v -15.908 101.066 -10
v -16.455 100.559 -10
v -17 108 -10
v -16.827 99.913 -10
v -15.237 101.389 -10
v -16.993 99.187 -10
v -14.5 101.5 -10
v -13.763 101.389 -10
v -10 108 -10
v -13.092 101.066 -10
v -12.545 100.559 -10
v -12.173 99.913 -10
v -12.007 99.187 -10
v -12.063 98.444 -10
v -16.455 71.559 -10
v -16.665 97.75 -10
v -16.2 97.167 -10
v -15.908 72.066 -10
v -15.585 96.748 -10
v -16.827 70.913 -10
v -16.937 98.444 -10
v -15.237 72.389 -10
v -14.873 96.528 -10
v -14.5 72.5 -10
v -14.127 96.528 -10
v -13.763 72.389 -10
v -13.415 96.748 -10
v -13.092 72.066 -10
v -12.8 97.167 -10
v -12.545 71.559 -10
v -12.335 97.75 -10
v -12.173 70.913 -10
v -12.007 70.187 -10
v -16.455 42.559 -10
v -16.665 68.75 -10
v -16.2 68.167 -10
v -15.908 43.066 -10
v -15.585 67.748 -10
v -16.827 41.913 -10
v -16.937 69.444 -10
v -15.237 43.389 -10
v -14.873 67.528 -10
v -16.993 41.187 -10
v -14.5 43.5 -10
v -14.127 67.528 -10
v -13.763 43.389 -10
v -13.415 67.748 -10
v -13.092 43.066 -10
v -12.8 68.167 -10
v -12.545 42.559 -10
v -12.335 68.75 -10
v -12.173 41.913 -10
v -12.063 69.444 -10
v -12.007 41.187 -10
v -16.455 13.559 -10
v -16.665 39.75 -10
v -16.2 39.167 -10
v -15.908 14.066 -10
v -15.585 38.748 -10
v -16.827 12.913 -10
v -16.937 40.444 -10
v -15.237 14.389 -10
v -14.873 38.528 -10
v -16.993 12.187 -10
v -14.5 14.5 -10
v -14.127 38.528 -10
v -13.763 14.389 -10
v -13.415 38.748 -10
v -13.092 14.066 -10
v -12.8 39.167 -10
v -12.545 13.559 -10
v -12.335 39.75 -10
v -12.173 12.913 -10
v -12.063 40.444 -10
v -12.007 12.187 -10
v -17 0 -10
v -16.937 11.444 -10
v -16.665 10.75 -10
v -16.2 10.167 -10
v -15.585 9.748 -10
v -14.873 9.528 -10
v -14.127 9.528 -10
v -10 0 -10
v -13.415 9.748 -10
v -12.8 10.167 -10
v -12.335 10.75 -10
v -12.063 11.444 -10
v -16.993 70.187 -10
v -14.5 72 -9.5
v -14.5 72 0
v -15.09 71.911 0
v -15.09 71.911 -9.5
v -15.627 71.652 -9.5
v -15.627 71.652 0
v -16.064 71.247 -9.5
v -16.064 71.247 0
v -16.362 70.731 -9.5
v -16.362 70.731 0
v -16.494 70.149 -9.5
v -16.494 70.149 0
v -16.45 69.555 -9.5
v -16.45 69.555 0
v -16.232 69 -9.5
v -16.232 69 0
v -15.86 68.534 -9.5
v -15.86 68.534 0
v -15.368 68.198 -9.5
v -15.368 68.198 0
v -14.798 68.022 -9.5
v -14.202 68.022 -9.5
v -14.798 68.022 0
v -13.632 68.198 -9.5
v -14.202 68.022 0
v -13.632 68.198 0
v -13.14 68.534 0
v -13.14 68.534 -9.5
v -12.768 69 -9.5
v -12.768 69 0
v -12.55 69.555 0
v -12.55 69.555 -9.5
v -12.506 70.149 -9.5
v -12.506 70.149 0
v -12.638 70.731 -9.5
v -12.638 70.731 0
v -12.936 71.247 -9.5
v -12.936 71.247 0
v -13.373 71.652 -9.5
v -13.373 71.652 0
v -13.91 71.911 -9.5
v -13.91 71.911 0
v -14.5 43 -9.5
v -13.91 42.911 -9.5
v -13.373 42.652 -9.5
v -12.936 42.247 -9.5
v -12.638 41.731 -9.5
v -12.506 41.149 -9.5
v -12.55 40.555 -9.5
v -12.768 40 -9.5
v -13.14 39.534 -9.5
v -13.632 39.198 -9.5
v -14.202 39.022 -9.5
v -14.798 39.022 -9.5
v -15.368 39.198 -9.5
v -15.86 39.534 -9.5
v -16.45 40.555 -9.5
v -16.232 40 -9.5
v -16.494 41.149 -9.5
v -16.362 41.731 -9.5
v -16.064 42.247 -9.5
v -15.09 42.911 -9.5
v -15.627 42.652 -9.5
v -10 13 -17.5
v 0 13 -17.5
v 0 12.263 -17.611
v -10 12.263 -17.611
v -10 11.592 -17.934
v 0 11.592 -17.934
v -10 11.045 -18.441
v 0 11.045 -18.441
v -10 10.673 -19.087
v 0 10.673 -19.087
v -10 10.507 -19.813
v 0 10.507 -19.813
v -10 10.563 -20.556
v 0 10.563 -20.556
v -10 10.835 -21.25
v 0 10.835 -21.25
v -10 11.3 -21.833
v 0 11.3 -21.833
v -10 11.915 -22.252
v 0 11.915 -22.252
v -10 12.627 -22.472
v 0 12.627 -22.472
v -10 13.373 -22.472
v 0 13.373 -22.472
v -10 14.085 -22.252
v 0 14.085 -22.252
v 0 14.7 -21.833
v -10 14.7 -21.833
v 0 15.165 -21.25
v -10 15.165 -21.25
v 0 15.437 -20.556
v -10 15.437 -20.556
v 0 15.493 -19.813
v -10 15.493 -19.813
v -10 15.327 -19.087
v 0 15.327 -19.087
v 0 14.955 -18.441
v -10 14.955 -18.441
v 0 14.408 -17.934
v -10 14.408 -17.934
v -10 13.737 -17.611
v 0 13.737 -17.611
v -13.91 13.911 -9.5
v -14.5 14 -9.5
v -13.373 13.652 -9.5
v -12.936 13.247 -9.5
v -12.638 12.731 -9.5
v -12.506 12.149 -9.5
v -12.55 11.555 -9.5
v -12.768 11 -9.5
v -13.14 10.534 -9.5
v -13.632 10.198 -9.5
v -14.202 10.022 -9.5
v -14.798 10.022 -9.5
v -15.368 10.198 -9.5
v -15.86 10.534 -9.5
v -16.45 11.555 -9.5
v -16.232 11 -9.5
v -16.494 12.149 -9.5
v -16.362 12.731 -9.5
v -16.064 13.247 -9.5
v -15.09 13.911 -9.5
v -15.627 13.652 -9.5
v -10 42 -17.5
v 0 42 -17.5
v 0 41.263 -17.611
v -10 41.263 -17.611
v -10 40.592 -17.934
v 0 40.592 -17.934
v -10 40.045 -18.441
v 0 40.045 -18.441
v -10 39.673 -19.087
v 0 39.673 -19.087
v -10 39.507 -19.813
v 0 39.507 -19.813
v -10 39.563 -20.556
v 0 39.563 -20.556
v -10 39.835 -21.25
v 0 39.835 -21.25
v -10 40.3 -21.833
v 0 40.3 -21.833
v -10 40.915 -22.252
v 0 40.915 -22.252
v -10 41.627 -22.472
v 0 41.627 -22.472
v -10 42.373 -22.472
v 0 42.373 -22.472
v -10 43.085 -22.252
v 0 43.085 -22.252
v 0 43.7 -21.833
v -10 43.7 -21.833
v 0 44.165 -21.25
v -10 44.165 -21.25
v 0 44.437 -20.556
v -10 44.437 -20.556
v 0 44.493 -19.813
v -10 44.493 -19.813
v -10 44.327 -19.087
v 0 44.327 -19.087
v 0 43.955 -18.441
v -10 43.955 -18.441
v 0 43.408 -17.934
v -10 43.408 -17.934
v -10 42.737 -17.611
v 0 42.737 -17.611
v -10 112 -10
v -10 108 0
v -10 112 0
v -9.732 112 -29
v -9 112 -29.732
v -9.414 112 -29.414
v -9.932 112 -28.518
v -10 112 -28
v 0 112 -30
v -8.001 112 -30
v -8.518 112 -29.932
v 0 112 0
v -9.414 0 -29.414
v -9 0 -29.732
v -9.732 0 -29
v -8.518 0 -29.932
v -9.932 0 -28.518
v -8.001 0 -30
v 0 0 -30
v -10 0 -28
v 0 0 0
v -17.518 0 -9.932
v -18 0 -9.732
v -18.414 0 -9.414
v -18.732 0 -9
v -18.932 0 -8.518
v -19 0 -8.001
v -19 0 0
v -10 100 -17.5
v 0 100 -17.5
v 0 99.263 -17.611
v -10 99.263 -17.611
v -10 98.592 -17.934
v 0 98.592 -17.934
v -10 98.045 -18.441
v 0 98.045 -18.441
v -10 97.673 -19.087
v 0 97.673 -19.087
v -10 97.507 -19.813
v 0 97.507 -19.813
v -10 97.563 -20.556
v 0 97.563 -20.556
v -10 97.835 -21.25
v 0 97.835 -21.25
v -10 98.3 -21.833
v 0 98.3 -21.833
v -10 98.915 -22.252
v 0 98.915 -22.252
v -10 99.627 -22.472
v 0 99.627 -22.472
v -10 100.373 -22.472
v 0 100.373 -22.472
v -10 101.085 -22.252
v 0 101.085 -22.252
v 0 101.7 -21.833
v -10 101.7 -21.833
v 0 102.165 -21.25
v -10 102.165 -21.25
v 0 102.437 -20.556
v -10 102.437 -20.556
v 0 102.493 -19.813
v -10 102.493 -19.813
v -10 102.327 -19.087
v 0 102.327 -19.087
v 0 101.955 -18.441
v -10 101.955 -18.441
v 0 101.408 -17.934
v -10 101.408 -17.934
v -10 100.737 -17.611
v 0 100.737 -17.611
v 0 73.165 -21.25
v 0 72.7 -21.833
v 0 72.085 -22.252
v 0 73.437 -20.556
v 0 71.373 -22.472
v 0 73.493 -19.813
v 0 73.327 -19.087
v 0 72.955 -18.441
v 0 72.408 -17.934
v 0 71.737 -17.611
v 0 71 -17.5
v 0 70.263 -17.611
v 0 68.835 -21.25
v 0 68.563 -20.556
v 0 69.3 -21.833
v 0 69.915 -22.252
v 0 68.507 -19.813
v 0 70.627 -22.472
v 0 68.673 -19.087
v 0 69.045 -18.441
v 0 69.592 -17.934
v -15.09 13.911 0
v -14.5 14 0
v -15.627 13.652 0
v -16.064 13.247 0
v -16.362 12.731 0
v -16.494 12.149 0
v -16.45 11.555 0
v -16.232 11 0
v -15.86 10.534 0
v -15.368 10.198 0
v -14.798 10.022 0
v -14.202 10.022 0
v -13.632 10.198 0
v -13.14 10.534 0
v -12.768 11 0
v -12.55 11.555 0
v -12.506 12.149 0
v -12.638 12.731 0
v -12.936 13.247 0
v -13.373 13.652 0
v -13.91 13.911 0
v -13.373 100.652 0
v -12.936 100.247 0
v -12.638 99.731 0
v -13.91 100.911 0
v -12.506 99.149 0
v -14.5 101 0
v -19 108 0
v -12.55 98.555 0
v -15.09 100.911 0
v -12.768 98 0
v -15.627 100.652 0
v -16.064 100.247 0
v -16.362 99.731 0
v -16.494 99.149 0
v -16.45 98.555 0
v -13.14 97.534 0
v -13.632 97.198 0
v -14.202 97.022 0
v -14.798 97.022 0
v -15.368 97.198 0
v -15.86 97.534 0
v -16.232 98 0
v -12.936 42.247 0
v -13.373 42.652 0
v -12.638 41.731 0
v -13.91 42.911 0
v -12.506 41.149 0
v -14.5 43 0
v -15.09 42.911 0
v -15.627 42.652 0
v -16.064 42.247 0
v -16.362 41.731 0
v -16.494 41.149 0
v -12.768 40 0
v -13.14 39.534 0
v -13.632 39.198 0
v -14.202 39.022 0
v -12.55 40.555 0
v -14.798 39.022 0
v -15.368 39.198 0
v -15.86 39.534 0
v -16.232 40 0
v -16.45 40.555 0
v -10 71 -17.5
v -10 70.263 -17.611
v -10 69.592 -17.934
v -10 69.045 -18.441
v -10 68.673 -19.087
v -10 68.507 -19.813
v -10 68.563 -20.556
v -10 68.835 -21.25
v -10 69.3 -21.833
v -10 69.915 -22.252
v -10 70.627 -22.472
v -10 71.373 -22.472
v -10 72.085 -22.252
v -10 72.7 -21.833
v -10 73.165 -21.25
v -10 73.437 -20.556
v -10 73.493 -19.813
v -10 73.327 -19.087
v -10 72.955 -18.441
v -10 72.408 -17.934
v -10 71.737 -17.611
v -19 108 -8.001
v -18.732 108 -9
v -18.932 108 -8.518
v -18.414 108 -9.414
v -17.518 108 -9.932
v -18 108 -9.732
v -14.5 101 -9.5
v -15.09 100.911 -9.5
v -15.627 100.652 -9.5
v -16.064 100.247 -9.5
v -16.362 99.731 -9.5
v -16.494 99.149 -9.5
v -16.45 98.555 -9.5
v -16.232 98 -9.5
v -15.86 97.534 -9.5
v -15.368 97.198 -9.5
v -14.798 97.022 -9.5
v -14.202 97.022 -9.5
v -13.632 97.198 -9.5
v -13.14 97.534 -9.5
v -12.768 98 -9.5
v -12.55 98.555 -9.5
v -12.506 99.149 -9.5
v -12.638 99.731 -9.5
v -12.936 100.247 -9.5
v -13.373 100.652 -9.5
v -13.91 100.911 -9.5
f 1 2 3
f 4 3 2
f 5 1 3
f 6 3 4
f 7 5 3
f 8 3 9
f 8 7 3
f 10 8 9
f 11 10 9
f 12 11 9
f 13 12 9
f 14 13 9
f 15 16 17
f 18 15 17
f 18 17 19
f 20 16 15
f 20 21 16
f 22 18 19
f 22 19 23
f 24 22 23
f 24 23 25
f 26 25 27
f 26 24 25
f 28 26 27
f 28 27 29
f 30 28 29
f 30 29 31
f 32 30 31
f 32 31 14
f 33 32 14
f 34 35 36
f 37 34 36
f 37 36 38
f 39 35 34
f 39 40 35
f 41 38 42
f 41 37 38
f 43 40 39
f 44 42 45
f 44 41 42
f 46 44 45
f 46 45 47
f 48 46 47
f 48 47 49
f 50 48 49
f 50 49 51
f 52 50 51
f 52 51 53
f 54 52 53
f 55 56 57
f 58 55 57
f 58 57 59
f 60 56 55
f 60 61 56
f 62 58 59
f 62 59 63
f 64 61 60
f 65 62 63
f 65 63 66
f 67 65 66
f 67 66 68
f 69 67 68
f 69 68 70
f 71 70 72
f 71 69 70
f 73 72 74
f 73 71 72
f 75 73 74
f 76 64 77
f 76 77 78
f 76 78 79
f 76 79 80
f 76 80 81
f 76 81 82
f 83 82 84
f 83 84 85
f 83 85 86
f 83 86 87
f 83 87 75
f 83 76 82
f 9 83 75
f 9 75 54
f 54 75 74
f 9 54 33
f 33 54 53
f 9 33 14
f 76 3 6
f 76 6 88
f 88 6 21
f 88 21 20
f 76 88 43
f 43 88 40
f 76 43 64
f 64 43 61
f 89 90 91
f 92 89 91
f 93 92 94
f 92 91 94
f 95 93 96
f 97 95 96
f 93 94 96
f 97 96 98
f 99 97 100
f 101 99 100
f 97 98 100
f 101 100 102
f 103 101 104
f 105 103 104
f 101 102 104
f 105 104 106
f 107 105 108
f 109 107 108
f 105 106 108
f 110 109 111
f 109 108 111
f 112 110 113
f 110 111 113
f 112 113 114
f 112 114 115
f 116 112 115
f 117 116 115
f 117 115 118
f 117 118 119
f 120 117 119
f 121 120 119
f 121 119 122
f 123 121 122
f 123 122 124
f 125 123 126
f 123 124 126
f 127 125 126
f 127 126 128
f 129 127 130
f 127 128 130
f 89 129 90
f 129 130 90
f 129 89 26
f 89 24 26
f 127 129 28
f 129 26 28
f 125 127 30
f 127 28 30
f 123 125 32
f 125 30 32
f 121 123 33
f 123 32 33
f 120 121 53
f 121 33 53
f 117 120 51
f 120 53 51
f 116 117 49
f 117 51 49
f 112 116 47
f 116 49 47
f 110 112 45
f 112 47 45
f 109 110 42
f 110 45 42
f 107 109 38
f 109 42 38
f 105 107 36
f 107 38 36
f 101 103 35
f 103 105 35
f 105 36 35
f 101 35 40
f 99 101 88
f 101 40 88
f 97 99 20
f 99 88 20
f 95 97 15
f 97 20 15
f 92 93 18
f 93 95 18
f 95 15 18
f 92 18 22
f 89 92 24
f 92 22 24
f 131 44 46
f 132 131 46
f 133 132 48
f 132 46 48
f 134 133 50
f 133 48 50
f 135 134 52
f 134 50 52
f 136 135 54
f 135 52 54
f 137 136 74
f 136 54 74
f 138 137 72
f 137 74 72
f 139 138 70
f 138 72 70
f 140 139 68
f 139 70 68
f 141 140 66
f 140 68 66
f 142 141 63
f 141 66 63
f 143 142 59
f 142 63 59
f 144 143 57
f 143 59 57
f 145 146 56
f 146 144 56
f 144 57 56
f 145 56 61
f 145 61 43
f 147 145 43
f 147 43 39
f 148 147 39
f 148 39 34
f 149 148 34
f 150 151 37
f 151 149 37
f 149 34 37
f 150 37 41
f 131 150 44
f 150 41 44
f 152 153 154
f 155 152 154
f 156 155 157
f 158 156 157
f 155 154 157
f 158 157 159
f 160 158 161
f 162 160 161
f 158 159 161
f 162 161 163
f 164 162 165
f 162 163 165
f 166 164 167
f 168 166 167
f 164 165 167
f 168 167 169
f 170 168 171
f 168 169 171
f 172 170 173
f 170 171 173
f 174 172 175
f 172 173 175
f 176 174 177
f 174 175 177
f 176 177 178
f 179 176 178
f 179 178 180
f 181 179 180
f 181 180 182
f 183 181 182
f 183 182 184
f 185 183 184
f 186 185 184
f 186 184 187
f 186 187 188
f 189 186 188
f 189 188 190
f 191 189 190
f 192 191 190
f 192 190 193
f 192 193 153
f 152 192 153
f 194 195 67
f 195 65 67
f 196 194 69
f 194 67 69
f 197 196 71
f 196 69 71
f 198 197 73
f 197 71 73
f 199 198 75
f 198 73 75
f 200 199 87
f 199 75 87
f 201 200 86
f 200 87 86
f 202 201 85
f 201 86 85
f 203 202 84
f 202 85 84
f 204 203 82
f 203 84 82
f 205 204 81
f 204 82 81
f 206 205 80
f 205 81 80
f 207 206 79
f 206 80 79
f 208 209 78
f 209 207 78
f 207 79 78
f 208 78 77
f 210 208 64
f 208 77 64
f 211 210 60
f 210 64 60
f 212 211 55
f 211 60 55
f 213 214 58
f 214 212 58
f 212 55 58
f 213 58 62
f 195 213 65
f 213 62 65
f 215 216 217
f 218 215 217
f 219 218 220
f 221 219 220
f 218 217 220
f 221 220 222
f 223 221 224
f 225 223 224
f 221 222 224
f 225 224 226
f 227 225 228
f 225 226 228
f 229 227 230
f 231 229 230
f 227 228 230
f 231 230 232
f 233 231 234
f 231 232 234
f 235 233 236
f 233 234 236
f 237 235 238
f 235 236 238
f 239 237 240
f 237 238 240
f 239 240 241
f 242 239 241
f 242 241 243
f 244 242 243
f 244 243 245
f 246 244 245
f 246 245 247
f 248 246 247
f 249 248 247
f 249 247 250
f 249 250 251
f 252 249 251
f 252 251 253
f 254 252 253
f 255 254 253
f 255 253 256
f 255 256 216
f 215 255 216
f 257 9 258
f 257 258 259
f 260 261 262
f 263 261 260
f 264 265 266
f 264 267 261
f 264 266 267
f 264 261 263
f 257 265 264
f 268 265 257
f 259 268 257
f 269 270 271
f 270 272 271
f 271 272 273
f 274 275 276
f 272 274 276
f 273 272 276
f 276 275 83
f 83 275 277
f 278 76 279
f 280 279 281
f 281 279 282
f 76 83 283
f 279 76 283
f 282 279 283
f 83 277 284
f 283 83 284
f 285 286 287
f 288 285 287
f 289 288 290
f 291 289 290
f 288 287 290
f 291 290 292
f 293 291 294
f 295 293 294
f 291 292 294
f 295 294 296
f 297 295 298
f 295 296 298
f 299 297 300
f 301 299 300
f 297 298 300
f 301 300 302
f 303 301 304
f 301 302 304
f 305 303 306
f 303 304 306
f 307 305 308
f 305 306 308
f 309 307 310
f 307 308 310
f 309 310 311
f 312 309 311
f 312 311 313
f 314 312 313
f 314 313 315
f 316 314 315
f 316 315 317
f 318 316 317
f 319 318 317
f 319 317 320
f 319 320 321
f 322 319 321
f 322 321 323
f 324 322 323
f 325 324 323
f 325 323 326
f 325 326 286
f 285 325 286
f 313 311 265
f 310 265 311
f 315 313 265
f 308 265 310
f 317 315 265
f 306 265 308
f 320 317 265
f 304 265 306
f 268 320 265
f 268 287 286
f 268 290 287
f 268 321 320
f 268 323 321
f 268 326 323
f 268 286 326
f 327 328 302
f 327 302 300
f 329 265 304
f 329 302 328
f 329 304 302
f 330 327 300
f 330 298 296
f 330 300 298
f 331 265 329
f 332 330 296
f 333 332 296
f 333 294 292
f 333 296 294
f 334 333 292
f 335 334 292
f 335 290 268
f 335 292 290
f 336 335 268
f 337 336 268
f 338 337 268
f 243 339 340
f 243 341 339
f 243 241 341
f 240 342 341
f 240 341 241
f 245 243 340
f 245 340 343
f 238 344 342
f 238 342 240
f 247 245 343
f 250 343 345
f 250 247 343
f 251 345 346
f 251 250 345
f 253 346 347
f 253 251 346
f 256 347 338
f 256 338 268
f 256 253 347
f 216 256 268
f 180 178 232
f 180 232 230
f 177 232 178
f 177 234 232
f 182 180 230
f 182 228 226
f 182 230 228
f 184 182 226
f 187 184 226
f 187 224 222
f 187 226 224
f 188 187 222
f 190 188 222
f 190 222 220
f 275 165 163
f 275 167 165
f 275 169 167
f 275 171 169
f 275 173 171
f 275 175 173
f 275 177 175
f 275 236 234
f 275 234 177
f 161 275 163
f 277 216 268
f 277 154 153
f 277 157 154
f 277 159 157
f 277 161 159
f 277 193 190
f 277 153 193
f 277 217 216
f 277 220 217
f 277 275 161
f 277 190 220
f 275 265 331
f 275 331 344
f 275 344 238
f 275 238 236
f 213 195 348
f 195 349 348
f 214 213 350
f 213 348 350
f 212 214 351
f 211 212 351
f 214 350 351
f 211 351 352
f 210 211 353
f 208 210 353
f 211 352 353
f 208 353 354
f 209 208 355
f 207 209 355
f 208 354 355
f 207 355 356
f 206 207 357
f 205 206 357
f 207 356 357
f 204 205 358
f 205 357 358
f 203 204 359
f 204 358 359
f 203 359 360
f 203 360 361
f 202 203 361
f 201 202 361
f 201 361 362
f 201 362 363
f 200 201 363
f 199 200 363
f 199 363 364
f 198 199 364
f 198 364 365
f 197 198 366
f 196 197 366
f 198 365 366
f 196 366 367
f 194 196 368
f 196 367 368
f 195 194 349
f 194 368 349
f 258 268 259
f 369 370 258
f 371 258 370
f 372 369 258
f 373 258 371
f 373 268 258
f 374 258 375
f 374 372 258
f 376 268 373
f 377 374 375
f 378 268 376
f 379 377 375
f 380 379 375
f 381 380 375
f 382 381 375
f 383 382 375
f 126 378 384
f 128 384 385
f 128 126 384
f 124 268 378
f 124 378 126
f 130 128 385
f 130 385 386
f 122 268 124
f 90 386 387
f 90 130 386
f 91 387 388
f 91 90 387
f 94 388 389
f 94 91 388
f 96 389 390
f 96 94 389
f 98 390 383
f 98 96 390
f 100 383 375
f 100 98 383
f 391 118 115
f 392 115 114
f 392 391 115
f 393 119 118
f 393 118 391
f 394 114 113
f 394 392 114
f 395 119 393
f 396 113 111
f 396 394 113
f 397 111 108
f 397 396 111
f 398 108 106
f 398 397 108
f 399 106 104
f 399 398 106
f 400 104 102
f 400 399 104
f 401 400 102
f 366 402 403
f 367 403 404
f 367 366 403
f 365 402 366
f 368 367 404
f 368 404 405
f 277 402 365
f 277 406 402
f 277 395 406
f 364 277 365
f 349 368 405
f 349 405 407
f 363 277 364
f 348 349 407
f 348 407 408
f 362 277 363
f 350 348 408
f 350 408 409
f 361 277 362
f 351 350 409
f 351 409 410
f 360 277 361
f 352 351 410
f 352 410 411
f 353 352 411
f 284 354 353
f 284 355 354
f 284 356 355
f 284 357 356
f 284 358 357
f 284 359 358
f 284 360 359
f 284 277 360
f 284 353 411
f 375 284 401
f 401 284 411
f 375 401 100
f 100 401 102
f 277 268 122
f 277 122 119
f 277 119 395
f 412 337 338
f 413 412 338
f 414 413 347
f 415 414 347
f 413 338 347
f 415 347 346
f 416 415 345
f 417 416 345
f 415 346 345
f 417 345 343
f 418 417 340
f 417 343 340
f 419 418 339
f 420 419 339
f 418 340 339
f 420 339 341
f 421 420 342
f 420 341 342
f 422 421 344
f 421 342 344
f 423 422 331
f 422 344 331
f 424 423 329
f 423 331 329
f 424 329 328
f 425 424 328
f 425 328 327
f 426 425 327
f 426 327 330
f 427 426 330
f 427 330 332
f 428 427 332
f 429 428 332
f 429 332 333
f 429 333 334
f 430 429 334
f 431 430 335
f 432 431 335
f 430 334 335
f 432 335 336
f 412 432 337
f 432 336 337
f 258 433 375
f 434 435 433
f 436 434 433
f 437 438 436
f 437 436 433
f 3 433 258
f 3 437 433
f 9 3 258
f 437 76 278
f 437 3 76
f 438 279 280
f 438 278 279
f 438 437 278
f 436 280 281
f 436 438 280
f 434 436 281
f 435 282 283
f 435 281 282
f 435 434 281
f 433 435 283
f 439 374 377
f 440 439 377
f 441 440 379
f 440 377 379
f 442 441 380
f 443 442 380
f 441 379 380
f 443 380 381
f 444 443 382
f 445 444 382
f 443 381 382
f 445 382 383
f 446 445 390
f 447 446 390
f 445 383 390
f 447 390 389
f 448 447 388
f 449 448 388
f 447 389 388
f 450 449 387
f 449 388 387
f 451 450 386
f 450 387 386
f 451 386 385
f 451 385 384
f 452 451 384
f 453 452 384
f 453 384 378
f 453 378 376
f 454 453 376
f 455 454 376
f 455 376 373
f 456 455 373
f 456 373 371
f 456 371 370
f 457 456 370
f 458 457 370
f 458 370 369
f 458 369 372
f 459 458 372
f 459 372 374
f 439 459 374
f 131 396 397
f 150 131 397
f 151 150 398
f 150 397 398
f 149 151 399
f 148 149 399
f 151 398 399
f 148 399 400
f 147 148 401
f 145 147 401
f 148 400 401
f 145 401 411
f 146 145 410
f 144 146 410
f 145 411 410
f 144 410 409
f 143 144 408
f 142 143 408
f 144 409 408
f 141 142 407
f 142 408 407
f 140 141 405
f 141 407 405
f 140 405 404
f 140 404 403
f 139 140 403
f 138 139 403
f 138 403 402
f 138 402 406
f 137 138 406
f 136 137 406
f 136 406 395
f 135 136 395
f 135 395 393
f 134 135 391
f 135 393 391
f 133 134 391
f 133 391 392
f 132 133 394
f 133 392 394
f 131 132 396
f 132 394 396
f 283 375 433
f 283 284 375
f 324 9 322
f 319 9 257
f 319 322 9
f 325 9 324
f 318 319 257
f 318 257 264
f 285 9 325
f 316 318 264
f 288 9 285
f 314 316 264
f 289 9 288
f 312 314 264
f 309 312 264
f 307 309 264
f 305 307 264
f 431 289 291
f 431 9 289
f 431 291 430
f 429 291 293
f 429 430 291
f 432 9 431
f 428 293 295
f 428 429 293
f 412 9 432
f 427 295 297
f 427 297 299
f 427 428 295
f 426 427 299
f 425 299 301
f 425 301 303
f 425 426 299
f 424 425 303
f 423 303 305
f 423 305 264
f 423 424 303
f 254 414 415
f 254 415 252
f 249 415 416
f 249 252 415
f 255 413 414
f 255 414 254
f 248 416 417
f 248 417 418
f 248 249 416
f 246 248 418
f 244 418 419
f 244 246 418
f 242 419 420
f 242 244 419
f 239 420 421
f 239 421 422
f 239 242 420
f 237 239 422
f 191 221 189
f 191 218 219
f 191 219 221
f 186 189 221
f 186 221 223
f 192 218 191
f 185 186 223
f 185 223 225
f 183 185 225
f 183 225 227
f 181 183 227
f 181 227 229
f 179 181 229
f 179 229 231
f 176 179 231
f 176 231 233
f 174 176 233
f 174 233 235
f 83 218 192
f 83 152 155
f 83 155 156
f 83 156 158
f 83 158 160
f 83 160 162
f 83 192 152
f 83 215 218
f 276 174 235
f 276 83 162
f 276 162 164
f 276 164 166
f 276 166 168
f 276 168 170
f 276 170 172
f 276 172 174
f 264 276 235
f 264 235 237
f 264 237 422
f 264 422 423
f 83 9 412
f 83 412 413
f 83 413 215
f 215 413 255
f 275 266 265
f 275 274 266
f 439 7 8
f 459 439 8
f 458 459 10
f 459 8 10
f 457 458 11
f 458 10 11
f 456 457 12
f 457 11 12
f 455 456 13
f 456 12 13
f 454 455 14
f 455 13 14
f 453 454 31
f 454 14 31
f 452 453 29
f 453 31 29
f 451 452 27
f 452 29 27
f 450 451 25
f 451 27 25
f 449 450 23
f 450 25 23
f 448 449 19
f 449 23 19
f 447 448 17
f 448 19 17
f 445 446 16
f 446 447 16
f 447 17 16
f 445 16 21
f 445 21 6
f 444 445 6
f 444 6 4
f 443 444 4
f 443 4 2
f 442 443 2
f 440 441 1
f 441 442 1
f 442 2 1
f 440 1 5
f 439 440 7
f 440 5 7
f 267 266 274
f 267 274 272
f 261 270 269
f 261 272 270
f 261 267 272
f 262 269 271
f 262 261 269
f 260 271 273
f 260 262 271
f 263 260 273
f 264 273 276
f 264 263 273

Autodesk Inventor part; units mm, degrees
ref_plane "YZ Plane" through (0, 0, 0) normal (1, 0, 0) x (0, 1, 0)
ref_plane "XZ Plane" through (0, 0, 0) normal (0, 1, 0) x (-1, 0, 0)
ref_plane "XY Plane" through (0, 0, 0) normal (0, 0, 1) x (1, 0, 0)
sketch "Skizze2" plane through (0, 0, 0) normal (0, 1, 0) x (-1, 0, 0)
  line L0 (0, 0) -> (19, 0)
  line L1 (19, 0) -> (19, -10)
  line L2 (19, -10) -> (10, -10)
  line L3 (10, -10) -> (10, -30)
  line L4 (10, -30) -> (0, -30)
  line L5 (0, -30) -> (0, 0)
  dimension "d6" = 10
  dimension "d7" = 20
  dimension "d8" = 10
  dimension "d9" = 9
extrude "Extrusion1" add sketch "Skizze2" along normal blind 112
sketch "Skizze3" plane through (-10, 0, -10) normal (0, 0, -1) x (-1, 0, 0)
  line L0 (0, 112) -> (9, 112) projected
  point P0 (-10, 0)
  point P1 (4.5, 99)
  point P2 (4.5, 70)
  point P3 (4.5, 41)
  point P4 (4.5, 12)
  point P5 (4.5, 112)
  point P6 (4.5, 112)
  dimension "d12" = 13
  dimension "d13" = 29
  dimension "d14" = 29
  dimension "d15" = 29
hole "Bohrung1" at (-14.5, 99, -10) at (-14.5, 70, -10) at (-14.5, 41, -10) at (-14.5, 12, -10) direction (0, 0, 1) diameter 4 depth 10 countersink diameter 5 countersink angle 90
sketch "Skizze4" plane through (-10, 0, -30) normal (-1, 0, 0) x (0, 0, 1)
  line L0 (0, 112) -> (20, 112) projected
  line L1 (0, 0) -> (20, 0) projected
  point P0 (30, 0)
  point P1 (10, 100)
  point P2 (10, 71)
  point P3 (10, 42)
  point P4 (10, 13)
  point P5 (10, 0)
  dimension "d30" = 12
  dimension "d31" = 29
  dimension "d32" = 29
  dimension "d33" = 29
hole "Bohrung2" at (-10, 100, -20) at (-10, 71, -20) at (-10, 42, -20) at (-10, 13, -20) direction (1, 0, 0) diameter 5 end through all
sketch "Skizze5" plane through (-10, 0, -10) normal (0, 0, -1) x (-1, 0, 0)
  line L0 (9, 112) -> (-0.0001, 112)
  line L1 (9, 112) -> (9, 108)
  line L2 (9, 0) -> (9, 112) projected
  line L3 (9, 108) -> (0, 108)
  line L4 (0, 0) -> (0, 112) projected
  line L5 (0, 112) -> (0, 108)
  point P0 (-10, 0)
  dimension "d40" = 4
extrude "Extrusion2" cut sketch "Skizze5" against normal up to surface (10 mm away)
fillet "Rundung1" radius 2 2 edges at (-10, 56, -30) (-19, 54, -10)
equation "\"d32\" = d31"
equation "\"d33\" = d32"
properties part number "1014_right"
